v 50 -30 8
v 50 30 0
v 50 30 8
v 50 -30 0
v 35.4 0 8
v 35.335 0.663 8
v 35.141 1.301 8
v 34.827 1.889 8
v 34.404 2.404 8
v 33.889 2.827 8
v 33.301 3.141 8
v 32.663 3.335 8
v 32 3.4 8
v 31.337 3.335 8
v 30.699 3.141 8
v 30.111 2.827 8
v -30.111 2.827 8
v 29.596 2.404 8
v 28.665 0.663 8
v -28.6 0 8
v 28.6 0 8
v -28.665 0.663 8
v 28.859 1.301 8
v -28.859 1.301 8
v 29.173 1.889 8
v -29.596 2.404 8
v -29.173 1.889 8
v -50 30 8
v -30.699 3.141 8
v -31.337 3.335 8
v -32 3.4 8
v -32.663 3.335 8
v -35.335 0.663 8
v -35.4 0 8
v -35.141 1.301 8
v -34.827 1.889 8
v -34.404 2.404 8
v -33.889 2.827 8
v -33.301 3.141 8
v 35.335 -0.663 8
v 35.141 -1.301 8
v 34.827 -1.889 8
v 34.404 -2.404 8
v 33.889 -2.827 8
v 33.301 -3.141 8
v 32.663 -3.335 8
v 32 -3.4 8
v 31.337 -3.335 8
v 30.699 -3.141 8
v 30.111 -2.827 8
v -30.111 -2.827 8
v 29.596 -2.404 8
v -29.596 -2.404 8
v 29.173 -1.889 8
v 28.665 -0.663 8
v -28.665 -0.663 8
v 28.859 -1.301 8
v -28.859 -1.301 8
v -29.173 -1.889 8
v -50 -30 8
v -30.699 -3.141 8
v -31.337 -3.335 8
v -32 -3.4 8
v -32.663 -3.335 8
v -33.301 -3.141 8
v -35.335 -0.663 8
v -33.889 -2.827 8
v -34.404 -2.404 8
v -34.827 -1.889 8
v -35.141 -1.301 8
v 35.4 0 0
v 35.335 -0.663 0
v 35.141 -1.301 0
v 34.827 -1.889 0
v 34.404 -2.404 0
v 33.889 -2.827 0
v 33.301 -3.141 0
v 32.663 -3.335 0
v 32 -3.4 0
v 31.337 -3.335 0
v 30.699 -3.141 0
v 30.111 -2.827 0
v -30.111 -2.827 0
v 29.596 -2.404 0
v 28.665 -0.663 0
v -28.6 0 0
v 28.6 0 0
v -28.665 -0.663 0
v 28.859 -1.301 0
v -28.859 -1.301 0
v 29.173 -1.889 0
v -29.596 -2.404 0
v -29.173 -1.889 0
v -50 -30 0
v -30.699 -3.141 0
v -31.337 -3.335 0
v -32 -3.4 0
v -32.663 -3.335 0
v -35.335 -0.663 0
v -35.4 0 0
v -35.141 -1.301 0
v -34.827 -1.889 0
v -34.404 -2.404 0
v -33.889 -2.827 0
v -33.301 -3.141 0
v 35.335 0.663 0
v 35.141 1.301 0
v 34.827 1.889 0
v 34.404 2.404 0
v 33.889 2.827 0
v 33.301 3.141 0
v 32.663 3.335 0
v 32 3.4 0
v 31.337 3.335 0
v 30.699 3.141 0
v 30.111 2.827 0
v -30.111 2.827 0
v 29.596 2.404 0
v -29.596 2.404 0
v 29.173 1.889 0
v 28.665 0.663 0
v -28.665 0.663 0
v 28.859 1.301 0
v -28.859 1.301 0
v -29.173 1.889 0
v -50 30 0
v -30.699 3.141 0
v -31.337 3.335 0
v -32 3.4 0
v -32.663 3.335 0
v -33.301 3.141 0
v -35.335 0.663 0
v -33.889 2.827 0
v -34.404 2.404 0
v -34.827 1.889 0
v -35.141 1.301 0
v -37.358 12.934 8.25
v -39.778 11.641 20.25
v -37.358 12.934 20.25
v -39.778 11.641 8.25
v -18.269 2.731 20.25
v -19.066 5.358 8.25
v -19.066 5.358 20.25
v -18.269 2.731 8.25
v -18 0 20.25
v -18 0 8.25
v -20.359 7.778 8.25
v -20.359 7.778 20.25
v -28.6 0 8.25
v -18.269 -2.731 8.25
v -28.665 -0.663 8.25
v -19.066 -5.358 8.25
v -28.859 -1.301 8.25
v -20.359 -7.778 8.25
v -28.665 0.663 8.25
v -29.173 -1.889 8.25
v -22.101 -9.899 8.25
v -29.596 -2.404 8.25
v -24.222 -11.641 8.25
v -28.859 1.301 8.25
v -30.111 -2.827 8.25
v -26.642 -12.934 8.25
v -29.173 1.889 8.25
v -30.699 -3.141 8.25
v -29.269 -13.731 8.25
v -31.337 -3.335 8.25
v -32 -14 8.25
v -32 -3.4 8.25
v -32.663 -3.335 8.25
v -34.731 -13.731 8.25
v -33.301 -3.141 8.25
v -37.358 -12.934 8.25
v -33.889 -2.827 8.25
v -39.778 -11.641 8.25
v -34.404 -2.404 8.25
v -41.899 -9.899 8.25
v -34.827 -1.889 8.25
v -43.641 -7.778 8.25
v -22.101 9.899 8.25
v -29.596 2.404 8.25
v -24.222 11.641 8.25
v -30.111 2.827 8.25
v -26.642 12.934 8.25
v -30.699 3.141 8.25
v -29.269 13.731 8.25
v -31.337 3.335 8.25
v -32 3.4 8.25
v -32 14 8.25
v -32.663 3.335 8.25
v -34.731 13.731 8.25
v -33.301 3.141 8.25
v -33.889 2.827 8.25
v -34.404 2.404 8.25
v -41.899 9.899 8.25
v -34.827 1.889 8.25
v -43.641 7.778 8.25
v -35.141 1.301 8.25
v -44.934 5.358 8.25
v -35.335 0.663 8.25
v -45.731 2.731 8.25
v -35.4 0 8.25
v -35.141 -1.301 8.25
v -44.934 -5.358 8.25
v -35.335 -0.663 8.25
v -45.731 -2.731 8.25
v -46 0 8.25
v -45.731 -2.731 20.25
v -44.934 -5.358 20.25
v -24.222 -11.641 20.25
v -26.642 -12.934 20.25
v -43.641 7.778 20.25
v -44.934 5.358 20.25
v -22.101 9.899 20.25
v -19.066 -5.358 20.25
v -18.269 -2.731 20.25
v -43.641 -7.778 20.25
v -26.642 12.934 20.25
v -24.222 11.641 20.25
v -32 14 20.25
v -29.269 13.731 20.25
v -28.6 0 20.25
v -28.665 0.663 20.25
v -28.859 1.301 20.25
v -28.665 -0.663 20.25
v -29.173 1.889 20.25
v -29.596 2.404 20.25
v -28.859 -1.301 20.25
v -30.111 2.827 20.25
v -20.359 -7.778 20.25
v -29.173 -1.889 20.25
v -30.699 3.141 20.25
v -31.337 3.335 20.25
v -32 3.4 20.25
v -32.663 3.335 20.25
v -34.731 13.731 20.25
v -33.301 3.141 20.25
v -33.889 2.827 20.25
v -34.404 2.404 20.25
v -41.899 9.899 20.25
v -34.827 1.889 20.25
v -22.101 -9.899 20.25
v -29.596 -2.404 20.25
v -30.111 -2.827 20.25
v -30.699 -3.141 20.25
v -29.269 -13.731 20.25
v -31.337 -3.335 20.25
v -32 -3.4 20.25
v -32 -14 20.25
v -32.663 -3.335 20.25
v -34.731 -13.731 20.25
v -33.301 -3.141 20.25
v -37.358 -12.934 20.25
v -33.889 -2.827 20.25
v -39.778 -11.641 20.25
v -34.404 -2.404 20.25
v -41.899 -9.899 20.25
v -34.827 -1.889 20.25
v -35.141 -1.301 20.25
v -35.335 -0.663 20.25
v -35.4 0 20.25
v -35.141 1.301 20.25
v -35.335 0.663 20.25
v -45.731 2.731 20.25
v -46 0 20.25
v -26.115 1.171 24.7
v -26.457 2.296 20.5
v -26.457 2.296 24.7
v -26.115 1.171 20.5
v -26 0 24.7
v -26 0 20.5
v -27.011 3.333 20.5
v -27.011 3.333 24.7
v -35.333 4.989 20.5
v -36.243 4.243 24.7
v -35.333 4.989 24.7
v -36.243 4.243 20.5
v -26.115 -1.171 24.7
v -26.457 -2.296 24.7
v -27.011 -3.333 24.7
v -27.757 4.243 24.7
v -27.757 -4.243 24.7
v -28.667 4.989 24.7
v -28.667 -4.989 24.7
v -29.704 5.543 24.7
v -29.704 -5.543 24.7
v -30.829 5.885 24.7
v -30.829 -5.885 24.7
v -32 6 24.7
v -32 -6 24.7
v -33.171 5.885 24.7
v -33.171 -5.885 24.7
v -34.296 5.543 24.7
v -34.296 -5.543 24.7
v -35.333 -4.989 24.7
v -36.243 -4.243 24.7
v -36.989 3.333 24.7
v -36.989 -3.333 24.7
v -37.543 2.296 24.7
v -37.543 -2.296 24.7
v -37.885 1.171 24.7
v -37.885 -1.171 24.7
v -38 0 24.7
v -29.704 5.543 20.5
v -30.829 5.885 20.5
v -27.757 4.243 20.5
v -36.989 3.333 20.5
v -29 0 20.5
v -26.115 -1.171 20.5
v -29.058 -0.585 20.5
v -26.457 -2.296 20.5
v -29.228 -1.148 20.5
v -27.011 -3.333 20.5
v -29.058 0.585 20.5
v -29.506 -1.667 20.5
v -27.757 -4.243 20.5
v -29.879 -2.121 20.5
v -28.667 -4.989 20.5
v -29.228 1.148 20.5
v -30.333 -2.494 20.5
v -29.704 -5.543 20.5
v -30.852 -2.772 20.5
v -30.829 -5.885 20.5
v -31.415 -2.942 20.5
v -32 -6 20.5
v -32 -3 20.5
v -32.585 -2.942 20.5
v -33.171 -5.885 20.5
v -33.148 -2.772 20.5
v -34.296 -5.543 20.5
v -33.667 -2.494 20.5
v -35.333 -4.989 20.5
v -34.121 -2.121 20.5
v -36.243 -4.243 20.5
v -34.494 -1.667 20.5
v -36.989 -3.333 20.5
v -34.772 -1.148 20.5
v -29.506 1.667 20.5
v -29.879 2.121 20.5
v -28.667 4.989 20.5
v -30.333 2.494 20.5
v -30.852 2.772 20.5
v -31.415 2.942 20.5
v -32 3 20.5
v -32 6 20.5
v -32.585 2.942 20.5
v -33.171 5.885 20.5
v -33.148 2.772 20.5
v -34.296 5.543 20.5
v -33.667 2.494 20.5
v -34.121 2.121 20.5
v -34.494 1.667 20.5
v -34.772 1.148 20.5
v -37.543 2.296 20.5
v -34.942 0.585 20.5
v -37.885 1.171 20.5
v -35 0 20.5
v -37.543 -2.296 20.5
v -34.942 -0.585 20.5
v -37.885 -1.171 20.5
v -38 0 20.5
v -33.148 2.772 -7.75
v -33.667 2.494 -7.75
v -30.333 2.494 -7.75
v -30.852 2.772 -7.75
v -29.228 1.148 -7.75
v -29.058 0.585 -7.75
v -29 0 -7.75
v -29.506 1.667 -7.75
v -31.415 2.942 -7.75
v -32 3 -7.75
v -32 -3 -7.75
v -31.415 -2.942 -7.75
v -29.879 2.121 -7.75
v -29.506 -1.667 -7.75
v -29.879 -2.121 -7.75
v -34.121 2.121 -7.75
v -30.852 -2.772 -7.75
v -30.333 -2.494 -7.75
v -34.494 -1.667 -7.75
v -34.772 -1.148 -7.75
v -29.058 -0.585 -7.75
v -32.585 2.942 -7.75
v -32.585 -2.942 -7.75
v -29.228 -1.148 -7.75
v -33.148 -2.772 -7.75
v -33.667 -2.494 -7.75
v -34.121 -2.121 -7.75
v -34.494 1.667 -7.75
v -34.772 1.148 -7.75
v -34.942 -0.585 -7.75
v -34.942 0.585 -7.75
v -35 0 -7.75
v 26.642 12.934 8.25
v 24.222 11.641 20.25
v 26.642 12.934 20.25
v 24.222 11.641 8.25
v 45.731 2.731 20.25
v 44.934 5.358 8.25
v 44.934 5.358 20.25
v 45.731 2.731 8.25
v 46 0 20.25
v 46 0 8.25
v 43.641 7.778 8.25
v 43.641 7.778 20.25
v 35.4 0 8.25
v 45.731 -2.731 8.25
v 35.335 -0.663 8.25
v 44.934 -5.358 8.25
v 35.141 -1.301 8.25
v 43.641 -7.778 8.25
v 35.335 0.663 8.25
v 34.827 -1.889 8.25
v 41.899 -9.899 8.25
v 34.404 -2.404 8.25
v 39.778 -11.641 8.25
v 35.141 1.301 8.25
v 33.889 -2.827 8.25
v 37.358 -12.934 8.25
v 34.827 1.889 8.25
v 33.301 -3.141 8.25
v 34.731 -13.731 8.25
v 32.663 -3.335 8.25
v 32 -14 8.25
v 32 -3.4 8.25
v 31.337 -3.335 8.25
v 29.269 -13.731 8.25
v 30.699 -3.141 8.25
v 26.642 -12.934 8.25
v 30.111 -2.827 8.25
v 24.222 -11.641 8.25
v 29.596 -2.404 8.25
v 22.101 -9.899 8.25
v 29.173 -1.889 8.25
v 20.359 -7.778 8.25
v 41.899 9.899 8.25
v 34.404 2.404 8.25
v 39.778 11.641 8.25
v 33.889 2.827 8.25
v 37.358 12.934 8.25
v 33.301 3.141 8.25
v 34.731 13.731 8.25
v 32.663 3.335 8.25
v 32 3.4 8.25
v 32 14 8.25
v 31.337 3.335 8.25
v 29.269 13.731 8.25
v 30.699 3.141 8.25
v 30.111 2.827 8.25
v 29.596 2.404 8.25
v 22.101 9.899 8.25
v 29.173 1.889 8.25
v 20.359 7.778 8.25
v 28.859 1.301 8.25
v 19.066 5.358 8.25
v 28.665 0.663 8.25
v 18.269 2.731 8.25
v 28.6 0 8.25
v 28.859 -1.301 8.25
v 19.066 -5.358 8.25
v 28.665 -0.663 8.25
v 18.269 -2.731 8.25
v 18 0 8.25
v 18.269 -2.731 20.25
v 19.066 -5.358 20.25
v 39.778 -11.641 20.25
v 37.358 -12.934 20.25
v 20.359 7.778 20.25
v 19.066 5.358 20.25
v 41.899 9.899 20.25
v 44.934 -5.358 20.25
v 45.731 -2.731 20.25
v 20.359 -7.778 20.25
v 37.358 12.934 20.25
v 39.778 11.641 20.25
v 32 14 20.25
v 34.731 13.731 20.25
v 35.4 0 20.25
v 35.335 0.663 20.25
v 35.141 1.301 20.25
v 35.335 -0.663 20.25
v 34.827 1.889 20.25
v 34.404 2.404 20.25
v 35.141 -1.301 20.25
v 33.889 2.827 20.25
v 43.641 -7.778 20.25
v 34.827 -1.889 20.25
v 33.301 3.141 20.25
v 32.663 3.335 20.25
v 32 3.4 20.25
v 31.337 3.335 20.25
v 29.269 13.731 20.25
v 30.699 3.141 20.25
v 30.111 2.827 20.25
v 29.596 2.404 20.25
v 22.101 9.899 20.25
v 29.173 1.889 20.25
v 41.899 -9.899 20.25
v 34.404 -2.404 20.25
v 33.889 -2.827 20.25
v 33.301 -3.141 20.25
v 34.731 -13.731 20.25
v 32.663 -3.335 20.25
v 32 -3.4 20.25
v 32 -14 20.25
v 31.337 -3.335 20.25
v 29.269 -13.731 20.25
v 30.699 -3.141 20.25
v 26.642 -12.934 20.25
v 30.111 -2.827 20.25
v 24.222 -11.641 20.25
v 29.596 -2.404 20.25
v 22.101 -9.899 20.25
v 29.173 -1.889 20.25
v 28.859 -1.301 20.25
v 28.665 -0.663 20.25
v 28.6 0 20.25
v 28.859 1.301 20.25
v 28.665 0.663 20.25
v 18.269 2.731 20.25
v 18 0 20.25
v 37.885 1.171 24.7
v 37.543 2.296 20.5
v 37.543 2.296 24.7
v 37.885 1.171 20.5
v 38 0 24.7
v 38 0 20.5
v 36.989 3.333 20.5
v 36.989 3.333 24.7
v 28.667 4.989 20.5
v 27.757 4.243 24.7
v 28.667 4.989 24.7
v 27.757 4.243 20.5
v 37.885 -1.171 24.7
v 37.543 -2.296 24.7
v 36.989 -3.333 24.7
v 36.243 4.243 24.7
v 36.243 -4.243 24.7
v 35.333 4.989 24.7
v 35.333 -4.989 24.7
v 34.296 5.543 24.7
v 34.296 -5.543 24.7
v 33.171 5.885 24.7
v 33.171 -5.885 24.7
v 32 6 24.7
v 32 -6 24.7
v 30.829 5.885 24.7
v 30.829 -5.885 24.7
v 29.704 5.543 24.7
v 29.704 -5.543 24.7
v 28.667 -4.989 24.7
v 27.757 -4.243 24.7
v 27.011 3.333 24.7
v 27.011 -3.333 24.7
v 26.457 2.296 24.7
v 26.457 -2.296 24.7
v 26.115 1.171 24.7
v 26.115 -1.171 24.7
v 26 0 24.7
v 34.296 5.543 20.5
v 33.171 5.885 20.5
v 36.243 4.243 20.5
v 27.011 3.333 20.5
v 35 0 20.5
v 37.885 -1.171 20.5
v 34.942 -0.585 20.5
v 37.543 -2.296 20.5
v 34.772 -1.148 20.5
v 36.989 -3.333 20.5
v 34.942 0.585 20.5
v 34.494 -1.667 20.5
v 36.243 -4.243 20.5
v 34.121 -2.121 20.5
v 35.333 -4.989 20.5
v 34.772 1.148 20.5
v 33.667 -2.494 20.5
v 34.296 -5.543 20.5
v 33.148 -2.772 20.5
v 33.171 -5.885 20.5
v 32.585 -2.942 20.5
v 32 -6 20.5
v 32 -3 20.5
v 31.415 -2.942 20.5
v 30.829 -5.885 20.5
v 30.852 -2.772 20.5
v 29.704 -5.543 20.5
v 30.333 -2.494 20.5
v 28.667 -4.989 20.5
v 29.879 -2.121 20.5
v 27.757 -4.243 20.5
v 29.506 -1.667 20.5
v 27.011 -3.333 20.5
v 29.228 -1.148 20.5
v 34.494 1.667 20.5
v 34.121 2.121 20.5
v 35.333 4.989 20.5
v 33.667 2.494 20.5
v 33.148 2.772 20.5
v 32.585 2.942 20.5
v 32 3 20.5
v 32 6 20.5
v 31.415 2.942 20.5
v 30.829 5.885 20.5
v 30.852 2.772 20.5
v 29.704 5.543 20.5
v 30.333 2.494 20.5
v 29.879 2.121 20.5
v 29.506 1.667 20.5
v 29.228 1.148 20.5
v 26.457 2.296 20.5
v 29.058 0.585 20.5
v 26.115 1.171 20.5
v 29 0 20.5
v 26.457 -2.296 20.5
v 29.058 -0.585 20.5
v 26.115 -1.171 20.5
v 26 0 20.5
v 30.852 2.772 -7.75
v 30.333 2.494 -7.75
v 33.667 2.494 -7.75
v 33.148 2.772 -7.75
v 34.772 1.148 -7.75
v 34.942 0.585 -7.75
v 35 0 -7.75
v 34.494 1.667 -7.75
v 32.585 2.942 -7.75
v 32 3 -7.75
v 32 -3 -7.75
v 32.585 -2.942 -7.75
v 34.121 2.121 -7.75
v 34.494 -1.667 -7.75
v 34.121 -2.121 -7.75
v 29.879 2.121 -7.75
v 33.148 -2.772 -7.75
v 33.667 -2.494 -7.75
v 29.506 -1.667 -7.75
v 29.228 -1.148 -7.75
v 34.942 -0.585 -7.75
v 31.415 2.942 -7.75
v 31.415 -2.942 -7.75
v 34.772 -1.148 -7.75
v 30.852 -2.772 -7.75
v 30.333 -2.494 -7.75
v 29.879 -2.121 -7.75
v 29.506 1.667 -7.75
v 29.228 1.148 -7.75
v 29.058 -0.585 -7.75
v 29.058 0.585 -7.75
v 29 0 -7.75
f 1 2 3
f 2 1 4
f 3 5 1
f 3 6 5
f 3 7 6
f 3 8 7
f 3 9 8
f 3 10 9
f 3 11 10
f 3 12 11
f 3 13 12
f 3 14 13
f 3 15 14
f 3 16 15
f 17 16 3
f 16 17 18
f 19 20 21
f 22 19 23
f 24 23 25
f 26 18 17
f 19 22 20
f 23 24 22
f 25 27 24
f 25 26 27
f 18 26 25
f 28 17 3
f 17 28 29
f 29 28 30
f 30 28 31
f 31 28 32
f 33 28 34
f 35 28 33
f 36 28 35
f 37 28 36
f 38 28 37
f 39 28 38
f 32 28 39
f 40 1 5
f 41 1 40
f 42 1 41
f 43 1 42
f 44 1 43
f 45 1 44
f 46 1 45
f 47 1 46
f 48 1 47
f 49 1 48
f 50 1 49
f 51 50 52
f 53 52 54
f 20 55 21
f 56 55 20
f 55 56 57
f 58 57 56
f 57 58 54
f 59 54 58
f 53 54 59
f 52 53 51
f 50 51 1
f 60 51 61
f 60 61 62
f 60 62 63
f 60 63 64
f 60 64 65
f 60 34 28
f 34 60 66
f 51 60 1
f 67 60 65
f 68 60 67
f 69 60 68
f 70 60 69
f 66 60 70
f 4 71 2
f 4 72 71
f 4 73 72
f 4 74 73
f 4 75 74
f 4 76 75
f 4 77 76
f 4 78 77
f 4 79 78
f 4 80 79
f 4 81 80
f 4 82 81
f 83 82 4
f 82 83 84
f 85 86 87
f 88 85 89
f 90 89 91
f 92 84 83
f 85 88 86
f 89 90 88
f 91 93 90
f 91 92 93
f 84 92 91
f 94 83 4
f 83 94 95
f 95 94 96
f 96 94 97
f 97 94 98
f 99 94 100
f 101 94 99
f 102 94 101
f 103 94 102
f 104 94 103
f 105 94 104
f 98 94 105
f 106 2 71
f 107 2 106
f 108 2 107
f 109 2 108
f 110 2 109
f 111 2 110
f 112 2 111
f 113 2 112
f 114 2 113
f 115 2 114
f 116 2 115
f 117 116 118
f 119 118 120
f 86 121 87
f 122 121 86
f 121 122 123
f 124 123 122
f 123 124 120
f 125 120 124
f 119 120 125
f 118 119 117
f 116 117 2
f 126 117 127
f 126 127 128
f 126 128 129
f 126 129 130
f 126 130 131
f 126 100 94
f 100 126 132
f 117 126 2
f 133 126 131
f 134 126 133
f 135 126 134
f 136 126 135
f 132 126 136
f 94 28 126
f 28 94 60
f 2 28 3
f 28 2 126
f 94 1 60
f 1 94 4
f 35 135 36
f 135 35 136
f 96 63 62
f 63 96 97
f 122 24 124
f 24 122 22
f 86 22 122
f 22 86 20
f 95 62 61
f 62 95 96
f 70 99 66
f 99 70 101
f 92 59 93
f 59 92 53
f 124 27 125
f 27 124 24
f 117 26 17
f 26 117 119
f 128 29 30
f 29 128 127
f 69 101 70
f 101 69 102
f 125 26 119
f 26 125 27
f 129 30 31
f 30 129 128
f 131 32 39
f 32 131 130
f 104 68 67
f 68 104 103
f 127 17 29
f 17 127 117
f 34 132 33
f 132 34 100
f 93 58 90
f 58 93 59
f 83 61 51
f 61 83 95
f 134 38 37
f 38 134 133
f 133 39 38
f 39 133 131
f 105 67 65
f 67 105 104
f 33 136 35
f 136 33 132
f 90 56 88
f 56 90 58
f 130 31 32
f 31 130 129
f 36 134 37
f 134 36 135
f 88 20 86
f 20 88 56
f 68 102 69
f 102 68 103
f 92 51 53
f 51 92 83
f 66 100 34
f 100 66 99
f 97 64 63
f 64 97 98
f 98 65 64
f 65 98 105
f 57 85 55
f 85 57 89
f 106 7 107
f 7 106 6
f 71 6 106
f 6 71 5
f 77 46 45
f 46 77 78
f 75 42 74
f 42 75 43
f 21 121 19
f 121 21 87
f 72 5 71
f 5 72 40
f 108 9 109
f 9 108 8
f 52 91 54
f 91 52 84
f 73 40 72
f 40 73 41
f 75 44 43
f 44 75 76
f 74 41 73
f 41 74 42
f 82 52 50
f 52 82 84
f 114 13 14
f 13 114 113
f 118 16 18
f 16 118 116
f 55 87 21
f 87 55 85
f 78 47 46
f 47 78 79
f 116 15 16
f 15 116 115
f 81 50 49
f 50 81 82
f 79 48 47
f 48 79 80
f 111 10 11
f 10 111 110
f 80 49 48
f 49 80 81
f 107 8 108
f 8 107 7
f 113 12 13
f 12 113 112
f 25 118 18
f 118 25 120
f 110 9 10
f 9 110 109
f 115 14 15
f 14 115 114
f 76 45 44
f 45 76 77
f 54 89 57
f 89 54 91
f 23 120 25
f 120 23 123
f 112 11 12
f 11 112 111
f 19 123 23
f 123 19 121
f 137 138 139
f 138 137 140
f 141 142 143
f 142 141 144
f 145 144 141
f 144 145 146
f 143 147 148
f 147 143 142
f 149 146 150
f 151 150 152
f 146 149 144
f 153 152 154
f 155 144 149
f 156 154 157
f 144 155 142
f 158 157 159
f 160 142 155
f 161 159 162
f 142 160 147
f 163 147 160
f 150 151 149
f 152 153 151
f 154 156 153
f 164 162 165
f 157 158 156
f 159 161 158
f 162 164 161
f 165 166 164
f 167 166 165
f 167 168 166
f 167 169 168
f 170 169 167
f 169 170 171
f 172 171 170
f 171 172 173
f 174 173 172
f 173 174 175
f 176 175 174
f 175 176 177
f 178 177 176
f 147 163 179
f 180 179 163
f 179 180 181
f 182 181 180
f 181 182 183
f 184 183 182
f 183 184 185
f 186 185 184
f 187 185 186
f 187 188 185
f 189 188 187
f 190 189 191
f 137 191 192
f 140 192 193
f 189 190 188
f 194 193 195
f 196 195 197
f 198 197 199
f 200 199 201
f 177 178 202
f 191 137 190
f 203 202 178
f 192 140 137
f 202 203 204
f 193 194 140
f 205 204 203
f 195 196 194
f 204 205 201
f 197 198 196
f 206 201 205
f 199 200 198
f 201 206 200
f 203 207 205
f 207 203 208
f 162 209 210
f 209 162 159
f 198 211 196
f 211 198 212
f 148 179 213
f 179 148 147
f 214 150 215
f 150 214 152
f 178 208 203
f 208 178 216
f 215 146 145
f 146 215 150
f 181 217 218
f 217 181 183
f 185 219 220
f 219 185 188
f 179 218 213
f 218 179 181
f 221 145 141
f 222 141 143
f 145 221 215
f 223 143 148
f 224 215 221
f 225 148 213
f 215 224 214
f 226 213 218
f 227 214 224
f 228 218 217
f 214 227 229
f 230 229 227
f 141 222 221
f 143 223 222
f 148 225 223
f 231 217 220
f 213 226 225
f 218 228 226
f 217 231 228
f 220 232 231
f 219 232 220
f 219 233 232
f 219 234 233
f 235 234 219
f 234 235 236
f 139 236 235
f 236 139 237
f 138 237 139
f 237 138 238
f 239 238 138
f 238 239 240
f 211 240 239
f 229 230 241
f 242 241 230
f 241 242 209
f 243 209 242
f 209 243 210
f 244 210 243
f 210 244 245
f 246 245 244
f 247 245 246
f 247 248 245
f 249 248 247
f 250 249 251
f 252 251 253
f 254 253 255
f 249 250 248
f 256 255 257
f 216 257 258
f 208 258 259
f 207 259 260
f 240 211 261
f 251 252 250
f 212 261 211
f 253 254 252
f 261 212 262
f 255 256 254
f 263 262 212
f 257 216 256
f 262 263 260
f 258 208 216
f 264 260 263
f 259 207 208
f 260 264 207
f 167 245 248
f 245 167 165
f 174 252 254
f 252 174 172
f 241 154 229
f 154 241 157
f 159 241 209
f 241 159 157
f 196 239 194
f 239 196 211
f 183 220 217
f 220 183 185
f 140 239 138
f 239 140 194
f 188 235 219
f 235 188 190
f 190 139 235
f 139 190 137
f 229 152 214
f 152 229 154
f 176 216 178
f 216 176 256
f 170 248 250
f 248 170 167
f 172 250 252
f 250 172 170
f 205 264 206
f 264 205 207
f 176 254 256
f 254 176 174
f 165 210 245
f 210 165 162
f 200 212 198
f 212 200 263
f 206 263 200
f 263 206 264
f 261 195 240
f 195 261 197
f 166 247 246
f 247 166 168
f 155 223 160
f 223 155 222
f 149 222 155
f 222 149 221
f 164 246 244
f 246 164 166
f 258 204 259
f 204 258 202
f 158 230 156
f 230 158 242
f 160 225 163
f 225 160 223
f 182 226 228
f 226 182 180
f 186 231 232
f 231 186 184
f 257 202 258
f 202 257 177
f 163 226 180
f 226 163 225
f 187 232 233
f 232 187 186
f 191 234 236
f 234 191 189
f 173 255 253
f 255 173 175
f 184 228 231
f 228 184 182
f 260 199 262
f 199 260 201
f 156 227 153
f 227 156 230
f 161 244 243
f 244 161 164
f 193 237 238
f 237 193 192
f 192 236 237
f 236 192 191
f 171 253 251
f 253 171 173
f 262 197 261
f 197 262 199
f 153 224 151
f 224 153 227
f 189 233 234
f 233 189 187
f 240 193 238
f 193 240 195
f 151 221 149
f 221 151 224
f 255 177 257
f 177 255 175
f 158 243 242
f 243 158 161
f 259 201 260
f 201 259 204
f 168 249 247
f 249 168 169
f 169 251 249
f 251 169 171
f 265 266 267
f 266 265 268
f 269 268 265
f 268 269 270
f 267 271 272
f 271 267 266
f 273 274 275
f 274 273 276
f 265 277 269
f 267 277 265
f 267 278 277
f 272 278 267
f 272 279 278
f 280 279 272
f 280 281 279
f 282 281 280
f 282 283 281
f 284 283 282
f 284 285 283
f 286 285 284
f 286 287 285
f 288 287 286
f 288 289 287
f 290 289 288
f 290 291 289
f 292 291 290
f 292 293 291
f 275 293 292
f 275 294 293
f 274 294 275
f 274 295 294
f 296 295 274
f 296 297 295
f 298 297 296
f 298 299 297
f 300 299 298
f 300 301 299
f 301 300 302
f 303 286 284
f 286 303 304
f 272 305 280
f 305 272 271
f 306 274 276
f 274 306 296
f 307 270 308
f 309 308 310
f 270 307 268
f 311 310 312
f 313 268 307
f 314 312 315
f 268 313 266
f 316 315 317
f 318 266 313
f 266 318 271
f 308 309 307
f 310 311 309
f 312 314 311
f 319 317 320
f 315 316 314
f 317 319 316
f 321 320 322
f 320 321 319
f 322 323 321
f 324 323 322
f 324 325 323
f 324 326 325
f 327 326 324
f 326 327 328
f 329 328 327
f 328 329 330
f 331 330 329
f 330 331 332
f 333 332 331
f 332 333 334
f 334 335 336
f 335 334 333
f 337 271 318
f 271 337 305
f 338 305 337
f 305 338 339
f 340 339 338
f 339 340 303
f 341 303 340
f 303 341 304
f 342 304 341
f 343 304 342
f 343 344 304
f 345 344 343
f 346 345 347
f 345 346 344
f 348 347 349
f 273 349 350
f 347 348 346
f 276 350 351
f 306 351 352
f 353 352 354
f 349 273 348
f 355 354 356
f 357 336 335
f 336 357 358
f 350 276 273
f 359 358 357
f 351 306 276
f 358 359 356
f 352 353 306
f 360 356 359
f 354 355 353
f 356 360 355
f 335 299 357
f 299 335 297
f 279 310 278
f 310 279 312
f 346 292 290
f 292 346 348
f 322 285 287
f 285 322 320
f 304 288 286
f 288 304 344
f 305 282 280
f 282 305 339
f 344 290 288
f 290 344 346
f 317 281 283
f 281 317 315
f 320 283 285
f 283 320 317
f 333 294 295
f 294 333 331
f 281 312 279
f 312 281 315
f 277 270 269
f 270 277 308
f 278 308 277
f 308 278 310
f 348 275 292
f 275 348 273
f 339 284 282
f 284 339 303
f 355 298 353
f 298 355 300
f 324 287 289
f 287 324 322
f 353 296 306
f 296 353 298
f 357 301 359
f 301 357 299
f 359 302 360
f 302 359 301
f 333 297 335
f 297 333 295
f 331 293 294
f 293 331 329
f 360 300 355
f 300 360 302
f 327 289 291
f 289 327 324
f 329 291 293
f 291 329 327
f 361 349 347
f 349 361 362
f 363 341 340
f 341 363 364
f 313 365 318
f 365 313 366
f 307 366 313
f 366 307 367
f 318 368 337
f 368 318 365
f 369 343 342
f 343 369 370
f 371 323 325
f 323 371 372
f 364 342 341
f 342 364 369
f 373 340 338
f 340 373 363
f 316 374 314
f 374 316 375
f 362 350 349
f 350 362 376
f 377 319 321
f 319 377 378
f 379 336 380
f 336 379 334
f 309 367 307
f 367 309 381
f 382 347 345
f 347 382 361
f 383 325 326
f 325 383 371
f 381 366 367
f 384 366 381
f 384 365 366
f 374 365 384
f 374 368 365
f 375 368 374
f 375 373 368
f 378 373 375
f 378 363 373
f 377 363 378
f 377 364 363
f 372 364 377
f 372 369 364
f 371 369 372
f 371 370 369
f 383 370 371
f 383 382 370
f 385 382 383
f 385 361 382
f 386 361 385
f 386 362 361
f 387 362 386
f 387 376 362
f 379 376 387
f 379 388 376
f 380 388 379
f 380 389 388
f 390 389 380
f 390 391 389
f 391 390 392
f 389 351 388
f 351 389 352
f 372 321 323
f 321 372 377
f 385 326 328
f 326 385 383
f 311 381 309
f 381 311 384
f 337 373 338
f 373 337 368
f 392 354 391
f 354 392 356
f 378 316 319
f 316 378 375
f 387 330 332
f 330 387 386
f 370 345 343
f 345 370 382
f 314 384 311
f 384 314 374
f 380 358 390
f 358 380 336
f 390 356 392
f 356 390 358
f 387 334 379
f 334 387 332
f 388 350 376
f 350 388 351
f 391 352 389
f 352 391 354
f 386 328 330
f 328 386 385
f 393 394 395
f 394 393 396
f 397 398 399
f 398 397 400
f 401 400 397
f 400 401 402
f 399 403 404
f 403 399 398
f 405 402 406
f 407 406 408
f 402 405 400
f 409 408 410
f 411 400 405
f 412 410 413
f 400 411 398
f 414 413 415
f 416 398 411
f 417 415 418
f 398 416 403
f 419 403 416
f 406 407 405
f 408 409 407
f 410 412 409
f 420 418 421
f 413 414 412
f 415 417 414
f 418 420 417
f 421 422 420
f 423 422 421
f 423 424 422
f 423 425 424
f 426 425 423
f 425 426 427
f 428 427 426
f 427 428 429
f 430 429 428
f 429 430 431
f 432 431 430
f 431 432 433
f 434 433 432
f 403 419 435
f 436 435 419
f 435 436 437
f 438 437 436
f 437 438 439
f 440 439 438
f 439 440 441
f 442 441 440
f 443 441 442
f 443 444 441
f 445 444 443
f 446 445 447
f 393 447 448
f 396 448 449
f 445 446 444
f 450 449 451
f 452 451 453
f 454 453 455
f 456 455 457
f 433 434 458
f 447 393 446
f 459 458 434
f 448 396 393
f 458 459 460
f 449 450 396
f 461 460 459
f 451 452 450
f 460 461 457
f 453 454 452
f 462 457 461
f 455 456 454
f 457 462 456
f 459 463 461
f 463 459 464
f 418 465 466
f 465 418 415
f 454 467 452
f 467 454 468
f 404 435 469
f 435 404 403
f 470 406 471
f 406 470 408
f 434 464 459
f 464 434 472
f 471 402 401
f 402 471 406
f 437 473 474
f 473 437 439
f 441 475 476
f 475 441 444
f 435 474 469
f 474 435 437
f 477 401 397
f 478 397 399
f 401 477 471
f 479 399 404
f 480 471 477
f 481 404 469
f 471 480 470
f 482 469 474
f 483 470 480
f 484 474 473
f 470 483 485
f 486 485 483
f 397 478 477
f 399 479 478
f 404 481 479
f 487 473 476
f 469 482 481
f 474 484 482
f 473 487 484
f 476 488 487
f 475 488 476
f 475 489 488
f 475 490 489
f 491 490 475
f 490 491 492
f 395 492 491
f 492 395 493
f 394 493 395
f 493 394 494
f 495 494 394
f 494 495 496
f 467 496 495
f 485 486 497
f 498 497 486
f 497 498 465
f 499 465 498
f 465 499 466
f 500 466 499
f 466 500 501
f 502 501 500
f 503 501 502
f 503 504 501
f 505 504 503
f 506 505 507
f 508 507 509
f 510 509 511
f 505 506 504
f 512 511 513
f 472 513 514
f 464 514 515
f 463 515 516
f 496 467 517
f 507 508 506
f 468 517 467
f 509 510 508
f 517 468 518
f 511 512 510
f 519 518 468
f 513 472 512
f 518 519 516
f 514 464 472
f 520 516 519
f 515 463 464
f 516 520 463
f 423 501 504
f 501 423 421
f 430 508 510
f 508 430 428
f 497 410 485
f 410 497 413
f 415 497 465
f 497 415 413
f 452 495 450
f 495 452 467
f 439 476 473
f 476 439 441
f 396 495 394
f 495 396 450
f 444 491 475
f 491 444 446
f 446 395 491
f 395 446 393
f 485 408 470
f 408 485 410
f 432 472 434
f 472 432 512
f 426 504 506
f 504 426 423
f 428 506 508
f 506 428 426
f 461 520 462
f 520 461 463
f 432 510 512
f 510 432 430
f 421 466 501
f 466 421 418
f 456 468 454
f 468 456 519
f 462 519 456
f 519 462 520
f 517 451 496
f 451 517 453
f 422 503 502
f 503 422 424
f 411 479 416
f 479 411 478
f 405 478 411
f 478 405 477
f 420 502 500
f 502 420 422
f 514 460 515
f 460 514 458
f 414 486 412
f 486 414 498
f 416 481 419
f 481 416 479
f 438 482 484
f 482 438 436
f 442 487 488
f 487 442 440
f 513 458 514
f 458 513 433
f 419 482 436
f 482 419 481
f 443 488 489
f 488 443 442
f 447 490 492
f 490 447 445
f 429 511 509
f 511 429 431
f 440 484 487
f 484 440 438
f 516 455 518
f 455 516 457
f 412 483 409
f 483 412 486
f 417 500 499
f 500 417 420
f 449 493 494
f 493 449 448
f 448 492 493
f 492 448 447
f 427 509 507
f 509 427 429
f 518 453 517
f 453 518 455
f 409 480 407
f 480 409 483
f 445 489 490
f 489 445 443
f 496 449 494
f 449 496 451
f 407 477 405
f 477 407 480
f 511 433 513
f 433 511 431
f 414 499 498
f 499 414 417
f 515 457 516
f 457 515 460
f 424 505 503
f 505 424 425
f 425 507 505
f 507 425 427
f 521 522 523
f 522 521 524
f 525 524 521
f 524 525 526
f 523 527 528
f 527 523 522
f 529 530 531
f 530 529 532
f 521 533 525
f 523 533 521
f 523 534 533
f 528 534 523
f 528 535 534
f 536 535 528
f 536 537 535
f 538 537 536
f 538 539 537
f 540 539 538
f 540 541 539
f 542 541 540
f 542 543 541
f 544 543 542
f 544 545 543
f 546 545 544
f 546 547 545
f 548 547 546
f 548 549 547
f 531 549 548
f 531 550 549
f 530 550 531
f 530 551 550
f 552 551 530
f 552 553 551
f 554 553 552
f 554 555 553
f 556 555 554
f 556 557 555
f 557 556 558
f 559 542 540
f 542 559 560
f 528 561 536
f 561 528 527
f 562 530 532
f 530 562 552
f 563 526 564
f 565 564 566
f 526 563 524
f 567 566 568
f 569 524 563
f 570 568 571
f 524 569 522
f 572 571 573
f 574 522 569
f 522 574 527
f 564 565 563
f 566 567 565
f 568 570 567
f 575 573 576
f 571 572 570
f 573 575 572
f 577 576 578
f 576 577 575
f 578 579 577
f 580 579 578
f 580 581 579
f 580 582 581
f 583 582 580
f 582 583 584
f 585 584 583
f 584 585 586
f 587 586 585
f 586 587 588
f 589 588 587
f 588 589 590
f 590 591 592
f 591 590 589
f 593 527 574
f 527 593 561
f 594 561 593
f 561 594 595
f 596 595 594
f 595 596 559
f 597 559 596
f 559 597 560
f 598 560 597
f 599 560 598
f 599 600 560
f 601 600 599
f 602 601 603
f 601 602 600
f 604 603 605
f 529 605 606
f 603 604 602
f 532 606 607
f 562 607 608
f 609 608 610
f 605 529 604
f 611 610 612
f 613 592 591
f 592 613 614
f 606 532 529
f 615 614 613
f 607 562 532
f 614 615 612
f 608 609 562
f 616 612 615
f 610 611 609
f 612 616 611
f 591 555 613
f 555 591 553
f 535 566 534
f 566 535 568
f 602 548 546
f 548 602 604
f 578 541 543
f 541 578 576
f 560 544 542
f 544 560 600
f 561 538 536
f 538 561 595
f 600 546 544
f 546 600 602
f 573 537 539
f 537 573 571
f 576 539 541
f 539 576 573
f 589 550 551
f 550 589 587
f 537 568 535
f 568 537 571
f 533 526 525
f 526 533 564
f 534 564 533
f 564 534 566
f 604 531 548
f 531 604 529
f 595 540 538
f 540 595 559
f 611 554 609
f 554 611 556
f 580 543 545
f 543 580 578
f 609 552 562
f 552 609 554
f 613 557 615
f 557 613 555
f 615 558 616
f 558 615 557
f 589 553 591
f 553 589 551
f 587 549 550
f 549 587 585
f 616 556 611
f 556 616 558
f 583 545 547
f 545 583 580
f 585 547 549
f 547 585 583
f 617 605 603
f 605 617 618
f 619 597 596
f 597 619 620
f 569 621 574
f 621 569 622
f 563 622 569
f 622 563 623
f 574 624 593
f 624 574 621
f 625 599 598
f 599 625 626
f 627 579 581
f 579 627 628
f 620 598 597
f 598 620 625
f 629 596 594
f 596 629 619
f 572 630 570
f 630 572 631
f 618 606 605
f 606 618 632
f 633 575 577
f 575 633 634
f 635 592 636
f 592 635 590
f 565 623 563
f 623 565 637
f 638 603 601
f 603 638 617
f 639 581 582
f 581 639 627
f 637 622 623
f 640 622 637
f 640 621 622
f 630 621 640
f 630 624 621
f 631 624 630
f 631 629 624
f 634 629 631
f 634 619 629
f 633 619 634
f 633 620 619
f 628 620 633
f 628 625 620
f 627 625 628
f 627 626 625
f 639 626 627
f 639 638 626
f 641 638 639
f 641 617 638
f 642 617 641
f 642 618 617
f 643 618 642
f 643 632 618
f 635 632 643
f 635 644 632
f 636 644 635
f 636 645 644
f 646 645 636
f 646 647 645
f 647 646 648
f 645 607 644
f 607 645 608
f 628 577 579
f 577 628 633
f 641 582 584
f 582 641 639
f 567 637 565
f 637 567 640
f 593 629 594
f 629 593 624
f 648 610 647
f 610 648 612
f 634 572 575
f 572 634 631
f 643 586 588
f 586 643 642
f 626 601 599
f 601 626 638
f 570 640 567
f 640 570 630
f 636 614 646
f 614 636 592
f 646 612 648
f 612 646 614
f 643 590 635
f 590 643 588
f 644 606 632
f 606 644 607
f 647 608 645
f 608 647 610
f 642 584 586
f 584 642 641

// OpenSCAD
$fn = 32;

// ------------------------------------------------------------------------
// Standoff columns: 2 d28 standoffs, bolts d6
// Every part is its own module, assembly() places them once.
// ------------------------------------------------------------------------

// --- part 1 ---
module base_plate() {
  difference() {
    translate([-50, -30, 0]) cube([100, 60, 8]);
    translate([-32, 0, -1]) cylinder(h = 10, d = 6.8);
    translate([32, 0, -1]) cylinder(h = 10, d = 6.8);
  }
}

// --- part 2 ---
module spacer1() {
  difference() {
      translate([0, 0, 0]) cylinder(h = 12, d = 28);
      translate([0, 0, -1]) cylinder(h = 14, d = 6.8);
    }
}

// --- part 3 ---
module bolt1() {
  cylinder(h = 4.2, d = 12);
  translate([0, 0, -28.25]) cylinder(h = 28.25, d = 6);
}

// --- part 4 ---
module spacer2() {
  difference() {
      translate([0, 0, 0]) cylinder(h = 12, d = 28);
      translate([0, 0, -1]) cylinder(h = 14, d = 6.8);
    }
}

// --- part 5 ---
module bolt2() {
  cylinder(h = 4.2, d = 12);
  translate([0, 0, -28.25]) cylinder(h = 28.25, d = 6);
}

// --- assembly ---
module assembly() {
  translate([0, 0, 0]) rotate([0, 0, 0]) base_plate();
  translate([-32, 0, 8.25]) rotate([0, 0, 0]) spacer1();
  translate([-32, 0, 20.5]) rotate([0, 0, 0]) bolt1();
  translate([32, 0, 8.25]) rotate([0, 0, 0]) spacer2();
  translate([32, 0, 20.5]) rotate([0, 0, 0]) bolt2();
}

assembly();
